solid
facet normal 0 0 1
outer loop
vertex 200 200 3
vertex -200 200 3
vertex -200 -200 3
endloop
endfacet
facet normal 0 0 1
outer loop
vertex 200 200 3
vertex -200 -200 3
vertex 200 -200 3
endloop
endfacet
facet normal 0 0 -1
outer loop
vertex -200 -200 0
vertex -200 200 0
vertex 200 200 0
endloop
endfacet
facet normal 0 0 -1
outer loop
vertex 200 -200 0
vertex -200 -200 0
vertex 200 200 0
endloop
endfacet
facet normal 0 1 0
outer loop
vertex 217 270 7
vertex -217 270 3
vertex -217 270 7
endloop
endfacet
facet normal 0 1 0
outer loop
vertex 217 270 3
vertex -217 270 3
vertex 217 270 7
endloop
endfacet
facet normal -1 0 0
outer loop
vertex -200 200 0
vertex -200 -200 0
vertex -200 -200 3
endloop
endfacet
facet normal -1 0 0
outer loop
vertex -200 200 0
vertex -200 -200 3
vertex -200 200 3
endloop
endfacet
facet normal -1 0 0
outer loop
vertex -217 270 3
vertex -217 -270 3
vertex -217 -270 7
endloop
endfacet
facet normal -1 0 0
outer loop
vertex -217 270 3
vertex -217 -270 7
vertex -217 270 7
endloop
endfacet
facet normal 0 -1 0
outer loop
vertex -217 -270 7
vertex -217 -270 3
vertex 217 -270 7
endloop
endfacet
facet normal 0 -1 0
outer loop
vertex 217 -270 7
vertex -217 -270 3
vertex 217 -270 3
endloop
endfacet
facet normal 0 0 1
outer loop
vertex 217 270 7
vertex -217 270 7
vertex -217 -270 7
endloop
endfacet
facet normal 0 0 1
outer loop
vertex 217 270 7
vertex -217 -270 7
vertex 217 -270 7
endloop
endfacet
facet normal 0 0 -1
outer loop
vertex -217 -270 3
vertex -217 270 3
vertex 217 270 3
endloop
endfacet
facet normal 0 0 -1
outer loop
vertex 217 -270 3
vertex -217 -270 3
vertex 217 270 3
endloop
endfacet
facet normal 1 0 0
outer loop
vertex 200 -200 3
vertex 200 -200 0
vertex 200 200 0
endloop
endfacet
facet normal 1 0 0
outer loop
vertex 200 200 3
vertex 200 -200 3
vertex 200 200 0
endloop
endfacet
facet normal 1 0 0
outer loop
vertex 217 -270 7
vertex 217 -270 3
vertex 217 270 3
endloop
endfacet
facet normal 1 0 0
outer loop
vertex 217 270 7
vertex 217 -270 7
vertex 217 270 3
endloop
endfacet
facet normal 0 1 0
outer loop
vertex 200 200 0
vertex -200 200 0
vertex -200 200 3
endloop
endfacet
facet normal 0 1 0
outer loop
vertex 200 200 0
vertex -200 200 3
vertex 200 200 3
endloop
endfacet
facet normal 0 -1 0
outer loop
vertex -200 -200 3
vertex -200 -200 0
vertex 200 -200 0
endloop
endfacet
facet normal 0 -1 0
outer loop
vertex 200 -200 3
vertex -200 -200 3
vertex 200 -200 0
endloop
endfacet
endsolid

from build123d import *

# Parameters (mm, degrees)
F0_W     = 400
F0_H     = 400
F1_DEPTH = 3
F2_W     = 434
F2_H     = 540
F2_W_2   = 400
F2_H_2   = 400
F3_DEPTH = 4


with BuildPart() as f1:
    # F0 (on Top) → F1 (new body)
    with BuildSketch(Plane.XY):
        Rectangle(F0_W, F0_H)
    extrude(amount=F1_DEPTH)


with BuildPart() as f3:
    # F2 (on face) → F3 (new body)
    with BuildSketch(Plane.XY.offset(3)):
        Rectangle(F2_W, F2_H)
        Rectangle(F2_W_2, F2_H_2, mode=Mode.SUBTRACT)
        Rectangle(F2_W_2, F2_H_2)
    extrude(amount=F3_DEPTH)


solid = Compound([f1.part, f3.part])
